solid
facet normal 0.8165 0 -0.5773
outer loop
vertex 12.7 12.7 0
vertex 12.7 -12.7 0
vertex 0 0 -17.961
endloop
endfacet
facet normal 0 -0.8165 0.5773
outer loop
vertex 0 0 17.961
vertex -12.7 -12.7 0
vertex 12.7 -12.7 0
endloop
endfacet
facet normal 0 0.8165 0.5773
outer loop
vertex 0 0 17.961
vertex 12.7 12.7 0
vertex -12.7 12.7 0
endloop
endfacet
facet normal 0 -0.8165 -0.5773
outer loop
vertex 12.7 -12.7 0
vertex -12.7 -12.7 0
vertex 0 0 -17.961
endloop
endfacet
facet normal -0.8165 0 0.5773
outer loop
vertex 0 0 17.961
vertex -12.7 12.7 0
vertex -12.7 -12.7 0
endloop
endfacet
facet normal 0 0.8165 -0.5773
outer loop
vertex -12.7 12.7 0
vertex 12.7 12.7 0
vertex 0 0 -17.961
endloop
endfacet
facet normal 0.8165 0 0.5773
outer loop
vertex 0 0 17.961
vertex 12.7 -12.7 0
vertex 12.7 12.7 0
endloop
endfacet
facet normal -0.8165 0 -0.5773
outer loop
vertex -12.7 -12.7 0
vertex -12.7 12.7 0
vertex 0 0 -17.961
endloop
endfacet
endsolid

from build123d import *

# Parameters (mm, degrees)
F0_W = 25.4
F0_H = 25.4


with BuildPart() as f2:
    # F0 (on Top) → F2 section 0
    with BuildSketch(Plane.XY, mode=Mode.PRIVATE) as f2_s0:
        Rectangle(F0_W, F0_H)
    loft([f2_s0.sketch, Vertex(0, 0, 17.960512)])

    # F0 (on Top) → F3 section 0
    with BuildSketch(Plane.XY, mode=Mode.PRIVATE) as f3_s0:
        Rectangle(F0_W, F0_H)
    loft([f3_s0.sketch, Vertex(0, 0, -17.960512)])


solid = f2.part
